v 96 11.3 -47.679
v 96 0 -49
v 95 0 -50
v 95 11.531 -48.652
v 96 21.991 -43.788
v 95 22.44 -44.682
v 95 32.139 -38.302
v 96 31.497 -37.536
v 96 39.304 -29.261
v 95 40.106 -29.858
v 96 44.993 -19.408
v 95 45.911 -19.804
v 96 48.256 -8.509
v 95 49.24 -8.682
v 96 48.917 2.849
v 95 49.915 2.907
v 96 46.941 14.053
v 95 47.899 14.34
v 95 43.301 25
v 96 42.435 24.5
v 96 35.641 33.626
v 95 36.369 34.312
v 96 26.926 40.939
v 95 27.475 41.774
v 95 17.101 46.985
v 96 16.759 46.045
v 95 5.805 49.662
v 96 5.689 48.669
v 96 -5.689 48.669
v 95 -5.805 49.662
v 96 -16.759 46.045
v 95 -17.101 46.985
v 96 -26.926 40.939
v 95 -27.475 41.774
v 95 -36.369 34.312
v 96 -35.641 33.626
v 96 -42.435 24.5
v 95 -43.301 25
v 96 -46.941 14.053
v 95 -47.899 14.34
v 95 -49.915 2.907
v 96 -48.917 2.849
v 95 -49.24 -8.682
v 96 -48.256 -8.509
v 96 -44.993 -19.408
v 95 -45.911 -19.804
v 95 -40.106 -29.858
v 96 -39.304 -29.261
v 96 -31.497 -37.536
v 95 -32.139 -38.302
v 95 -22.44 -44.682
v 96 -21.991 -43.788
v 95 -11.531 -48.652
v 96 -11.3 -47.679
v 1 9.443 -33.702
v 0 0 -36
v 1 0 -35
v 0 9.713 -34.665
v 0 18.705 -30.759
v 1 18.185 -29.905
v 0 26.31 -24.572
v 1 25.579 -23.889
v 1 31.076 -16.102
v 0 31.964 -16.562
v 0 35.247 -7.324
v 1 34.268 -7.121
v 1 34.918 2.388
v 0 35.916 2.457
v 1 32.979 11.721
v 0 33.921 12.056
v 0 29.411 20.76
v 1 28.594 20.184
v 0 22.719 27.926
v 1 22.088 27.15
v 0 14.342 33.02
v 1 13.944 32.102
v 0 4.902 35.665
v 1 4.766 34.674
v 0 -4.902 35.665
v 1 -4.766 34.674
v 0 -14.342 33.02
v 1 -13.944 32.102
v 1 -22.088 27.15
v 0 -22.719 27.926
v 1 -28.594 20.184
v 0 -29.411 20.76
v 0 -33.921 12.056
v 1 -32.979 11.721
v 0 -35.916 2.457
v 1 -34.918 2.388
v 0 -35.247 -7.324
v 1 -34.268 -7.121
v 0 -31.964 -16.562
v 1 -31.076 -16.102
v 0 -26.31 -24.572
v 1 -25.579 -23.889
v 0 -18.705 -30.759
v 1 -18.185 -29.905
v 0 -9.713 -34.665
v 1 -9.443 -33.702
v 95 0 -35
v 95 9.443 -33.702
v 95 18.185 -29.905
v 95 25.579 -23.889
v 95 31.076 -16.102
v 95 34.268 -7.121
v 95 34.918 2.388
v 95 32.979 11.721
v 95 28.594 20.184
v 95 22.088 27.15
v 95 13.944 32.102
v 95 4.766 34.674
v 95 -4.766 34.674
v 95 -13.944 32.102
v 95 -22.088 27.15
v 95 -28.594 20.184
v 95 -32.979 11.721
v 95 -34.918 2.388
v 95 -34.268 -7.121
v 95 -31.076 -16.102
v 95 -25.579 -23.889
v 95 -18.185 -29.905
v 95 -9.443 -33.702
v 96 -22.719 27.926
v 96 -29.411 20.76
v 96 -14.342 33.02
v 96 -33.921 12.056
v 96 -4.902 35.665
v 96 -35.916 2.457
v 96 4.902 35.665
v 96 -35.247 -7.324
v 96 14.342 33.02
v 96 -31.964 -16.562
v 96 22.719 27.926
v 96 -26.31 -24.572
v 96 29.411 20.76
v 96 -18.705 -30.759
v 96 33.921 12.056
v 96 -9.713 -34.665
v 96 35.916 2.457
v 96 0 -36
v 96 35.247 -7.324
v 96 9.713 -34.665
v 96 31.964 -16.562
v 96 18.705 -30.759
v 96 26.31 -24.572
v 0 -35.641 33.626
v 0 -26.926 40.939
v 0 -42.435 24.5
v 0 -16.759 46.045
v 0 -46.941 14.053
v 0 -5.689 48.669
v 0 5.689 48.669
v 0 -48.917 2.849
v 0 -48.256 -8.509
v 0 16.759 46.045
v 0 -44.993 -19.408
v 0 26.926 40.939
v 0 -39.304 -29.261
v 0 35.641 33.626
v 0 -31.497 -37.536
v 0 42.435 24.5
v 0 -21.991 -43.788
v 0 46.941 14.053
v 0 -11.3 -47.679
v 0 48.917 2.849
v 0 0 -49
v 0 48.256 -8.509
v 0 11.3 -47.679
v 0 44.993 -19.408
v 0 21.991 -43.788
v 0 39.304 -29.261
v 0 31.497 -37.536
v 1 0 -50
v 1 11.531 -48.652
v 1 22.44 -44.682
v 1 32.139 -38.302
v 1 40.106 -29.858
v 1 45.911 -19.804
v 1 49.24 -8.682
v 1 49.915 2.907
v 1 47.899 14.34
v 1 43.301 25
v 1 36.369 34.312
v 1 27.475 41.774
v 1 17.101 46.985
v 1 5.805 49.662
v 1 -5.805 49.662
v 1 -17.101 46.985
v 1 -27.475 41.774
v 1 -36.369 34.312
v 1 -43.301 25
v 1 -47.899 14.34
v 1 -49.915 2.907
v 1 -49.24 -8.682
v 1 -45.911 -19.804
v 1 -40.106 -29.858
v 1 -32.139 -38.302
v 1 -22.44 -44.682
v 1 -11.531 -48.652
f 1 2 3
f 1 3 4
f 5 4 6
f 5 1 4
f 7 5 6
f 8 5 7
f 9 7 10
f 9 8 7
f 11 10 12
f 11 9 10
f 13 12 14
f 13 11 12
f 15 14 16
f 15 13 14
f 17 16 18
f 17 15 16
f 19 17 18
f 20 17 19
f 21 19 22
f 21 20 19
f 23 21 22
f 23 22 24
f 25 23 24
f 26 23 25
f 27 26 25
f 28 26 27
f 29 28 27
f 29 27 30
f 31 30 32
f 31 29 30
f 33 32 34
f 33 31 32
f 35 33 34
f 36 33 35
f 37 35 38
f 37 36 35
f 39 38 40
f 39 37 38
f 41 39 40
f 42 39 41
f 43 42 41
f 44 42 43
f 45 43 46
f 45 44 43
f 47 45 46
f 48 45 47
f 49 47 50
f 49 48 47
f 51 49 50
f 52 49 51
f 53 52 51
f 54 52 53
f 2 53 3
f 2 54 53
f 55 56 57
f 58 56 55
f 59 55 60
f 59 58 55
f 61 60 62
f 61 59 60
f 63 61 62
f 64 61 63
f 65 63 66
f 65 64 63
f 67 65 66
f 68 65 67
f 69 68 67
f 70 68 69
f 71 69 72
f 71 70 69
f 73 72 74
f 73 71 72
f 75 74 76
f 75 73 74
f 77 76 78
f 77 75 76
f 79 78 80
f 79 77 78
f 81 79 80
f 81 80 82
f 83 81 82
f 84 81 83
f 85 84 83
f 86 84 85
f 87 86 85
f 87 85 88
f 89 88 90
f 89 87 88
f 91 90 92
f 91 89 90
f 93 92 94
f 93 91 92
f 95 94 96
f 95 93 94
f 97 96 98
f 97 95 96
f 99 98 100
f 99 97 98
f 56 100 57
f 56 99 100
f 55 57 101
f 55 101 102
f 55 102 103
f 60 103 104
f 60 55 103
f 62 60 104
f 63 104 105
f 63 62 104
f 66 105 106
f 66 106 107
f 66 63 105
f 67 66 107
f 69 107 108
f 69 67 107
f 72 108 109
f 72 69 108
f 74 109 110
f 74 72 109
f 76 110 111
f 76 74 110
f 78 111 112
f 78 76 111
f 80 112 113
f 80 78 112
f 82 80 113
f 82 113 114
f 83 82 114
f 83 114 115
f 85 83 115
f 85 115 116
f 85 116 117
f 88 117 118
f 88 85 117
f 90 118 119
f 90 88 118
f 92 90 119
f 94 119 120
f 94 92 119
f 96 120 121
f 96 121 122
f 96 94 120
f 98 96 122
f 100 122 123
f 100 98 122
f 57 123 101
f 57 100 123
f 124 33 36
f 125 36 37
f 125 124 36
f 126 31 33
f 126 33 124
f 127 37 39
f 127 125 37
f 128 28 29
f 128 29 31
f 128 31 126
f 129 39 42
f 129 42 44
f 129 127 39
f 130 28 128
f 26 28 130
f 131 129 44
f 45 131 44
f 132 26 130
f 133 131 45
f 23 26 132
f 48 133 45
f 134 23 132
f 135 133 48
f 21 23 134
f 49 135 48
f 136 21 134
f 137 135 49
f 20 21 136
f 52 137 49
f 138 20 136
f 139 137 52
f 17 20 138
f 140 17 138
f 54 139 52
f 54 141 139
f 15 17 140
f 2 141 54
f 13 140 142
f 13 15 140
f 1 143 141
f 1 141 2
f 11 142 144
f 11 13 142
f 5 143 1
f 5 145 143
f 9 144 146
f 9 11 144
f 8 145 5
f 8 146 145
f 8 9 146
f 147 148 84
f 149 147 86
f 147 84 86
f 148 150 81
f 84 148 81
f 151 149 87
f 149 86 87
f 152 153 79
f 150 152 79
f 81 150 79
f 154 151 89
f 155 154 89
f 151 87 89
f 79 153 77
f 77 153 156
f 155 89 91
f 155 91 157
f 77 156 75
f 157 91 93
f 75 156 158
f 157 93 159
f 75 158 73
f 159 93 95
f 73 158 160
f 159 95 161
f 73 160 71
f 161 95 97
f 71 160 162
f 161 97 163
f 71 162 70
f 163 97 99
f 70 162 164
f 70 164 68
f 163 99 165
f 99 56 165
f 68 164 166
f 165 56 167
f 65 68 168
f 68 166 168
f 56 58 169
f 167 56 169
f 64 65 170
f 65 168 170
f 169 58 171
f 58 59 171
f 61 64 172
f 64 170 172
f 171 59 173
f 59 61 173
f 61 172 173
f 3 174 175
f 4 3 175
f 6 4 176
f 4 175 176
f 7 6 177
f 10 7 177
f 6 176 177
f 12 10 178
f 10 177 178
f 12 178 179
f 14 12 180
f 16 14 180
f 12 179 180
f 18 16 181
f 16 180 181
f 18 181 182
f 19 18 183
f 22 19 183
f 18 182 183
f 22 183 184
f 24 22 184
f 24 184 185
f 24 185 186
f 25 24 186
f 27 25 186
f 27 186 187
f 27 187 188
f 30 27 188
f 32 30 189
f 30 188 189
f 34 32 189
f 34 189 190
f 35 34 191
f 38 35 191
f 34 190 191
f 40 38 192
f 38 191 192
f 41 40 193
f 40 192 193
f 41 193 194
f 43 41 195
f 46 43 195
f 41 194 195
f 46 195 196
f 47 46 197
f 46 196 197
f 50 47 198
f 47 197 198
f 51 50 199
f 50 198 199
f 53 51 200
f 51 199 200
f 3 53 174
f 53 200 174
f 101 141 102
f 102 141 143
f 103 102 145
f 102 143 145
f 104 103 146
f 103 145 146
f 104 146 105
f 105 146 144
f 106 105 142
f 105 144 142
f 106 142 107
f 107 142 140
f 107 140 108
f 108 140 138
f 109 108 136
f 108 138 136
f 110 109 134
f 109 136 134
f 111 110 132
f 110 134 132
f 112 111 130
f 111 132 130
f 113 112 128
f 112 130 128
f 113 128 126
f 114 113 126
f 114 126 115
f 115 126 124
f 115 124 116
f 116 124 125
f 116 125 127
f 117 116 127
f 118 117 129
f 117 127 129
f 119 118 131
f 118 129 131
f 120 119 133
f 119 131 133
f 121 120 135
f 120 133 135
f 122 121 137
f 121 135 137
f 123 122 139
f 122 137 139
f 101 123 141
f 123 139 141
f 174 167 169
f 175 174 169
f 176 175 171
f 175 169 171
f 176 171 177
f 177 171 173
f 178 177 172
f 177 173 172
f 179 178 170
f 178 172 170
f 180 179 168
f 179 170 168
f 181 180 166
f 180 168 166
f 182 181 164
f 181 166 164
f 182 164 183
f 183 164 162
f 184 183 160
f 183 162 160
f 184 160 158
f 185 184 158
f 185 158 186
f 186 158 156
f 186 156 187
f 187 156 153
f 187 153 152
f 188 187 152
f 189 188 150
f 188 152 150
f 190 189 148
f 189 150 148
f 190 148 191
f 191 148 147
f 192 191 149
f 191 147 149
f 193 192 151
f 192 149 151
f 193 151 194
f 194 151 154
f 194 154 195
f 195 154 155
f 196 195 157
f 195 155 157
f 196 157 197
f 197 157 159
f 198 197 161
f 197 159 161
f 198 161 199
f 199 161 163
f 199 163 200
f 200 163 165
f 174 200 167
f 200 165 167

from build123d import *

# Parameters (mm, degrees)
SKETCH_1_R      = 50
SKETCH_1_R_2    = 35
EXTRUDE_1_DEPTH = 96
CHAMFER_1_SIZE  = 1


with BuildPart() as part:
    # 草图1 → 凸台-拉伸1 (new body)
    with BuildSketch(Plane(origin=(0, 0, 0), x_dir=(0, 0, -1), z_dir=(1, 0, 0))):
        Circle(SKETCH_1_R)
        Circle(SKETCH_1_R_2, mode=Mode.SUBTRACT)
    extrude(amount=EXTRUDE_1_DEPTH)

    # 倒角1
    chamfer_1_edges = [part.edges().sort_by_distance(p)[0] for p in [
        (0, 0, 50),
        (96, 0, 50),
        (0, 0, 35),
        (96, 0, 35),
    ]]
    chamfer(chamfer_1_edges, length=CHAMFER_1_SIZE)


solid = part.part
